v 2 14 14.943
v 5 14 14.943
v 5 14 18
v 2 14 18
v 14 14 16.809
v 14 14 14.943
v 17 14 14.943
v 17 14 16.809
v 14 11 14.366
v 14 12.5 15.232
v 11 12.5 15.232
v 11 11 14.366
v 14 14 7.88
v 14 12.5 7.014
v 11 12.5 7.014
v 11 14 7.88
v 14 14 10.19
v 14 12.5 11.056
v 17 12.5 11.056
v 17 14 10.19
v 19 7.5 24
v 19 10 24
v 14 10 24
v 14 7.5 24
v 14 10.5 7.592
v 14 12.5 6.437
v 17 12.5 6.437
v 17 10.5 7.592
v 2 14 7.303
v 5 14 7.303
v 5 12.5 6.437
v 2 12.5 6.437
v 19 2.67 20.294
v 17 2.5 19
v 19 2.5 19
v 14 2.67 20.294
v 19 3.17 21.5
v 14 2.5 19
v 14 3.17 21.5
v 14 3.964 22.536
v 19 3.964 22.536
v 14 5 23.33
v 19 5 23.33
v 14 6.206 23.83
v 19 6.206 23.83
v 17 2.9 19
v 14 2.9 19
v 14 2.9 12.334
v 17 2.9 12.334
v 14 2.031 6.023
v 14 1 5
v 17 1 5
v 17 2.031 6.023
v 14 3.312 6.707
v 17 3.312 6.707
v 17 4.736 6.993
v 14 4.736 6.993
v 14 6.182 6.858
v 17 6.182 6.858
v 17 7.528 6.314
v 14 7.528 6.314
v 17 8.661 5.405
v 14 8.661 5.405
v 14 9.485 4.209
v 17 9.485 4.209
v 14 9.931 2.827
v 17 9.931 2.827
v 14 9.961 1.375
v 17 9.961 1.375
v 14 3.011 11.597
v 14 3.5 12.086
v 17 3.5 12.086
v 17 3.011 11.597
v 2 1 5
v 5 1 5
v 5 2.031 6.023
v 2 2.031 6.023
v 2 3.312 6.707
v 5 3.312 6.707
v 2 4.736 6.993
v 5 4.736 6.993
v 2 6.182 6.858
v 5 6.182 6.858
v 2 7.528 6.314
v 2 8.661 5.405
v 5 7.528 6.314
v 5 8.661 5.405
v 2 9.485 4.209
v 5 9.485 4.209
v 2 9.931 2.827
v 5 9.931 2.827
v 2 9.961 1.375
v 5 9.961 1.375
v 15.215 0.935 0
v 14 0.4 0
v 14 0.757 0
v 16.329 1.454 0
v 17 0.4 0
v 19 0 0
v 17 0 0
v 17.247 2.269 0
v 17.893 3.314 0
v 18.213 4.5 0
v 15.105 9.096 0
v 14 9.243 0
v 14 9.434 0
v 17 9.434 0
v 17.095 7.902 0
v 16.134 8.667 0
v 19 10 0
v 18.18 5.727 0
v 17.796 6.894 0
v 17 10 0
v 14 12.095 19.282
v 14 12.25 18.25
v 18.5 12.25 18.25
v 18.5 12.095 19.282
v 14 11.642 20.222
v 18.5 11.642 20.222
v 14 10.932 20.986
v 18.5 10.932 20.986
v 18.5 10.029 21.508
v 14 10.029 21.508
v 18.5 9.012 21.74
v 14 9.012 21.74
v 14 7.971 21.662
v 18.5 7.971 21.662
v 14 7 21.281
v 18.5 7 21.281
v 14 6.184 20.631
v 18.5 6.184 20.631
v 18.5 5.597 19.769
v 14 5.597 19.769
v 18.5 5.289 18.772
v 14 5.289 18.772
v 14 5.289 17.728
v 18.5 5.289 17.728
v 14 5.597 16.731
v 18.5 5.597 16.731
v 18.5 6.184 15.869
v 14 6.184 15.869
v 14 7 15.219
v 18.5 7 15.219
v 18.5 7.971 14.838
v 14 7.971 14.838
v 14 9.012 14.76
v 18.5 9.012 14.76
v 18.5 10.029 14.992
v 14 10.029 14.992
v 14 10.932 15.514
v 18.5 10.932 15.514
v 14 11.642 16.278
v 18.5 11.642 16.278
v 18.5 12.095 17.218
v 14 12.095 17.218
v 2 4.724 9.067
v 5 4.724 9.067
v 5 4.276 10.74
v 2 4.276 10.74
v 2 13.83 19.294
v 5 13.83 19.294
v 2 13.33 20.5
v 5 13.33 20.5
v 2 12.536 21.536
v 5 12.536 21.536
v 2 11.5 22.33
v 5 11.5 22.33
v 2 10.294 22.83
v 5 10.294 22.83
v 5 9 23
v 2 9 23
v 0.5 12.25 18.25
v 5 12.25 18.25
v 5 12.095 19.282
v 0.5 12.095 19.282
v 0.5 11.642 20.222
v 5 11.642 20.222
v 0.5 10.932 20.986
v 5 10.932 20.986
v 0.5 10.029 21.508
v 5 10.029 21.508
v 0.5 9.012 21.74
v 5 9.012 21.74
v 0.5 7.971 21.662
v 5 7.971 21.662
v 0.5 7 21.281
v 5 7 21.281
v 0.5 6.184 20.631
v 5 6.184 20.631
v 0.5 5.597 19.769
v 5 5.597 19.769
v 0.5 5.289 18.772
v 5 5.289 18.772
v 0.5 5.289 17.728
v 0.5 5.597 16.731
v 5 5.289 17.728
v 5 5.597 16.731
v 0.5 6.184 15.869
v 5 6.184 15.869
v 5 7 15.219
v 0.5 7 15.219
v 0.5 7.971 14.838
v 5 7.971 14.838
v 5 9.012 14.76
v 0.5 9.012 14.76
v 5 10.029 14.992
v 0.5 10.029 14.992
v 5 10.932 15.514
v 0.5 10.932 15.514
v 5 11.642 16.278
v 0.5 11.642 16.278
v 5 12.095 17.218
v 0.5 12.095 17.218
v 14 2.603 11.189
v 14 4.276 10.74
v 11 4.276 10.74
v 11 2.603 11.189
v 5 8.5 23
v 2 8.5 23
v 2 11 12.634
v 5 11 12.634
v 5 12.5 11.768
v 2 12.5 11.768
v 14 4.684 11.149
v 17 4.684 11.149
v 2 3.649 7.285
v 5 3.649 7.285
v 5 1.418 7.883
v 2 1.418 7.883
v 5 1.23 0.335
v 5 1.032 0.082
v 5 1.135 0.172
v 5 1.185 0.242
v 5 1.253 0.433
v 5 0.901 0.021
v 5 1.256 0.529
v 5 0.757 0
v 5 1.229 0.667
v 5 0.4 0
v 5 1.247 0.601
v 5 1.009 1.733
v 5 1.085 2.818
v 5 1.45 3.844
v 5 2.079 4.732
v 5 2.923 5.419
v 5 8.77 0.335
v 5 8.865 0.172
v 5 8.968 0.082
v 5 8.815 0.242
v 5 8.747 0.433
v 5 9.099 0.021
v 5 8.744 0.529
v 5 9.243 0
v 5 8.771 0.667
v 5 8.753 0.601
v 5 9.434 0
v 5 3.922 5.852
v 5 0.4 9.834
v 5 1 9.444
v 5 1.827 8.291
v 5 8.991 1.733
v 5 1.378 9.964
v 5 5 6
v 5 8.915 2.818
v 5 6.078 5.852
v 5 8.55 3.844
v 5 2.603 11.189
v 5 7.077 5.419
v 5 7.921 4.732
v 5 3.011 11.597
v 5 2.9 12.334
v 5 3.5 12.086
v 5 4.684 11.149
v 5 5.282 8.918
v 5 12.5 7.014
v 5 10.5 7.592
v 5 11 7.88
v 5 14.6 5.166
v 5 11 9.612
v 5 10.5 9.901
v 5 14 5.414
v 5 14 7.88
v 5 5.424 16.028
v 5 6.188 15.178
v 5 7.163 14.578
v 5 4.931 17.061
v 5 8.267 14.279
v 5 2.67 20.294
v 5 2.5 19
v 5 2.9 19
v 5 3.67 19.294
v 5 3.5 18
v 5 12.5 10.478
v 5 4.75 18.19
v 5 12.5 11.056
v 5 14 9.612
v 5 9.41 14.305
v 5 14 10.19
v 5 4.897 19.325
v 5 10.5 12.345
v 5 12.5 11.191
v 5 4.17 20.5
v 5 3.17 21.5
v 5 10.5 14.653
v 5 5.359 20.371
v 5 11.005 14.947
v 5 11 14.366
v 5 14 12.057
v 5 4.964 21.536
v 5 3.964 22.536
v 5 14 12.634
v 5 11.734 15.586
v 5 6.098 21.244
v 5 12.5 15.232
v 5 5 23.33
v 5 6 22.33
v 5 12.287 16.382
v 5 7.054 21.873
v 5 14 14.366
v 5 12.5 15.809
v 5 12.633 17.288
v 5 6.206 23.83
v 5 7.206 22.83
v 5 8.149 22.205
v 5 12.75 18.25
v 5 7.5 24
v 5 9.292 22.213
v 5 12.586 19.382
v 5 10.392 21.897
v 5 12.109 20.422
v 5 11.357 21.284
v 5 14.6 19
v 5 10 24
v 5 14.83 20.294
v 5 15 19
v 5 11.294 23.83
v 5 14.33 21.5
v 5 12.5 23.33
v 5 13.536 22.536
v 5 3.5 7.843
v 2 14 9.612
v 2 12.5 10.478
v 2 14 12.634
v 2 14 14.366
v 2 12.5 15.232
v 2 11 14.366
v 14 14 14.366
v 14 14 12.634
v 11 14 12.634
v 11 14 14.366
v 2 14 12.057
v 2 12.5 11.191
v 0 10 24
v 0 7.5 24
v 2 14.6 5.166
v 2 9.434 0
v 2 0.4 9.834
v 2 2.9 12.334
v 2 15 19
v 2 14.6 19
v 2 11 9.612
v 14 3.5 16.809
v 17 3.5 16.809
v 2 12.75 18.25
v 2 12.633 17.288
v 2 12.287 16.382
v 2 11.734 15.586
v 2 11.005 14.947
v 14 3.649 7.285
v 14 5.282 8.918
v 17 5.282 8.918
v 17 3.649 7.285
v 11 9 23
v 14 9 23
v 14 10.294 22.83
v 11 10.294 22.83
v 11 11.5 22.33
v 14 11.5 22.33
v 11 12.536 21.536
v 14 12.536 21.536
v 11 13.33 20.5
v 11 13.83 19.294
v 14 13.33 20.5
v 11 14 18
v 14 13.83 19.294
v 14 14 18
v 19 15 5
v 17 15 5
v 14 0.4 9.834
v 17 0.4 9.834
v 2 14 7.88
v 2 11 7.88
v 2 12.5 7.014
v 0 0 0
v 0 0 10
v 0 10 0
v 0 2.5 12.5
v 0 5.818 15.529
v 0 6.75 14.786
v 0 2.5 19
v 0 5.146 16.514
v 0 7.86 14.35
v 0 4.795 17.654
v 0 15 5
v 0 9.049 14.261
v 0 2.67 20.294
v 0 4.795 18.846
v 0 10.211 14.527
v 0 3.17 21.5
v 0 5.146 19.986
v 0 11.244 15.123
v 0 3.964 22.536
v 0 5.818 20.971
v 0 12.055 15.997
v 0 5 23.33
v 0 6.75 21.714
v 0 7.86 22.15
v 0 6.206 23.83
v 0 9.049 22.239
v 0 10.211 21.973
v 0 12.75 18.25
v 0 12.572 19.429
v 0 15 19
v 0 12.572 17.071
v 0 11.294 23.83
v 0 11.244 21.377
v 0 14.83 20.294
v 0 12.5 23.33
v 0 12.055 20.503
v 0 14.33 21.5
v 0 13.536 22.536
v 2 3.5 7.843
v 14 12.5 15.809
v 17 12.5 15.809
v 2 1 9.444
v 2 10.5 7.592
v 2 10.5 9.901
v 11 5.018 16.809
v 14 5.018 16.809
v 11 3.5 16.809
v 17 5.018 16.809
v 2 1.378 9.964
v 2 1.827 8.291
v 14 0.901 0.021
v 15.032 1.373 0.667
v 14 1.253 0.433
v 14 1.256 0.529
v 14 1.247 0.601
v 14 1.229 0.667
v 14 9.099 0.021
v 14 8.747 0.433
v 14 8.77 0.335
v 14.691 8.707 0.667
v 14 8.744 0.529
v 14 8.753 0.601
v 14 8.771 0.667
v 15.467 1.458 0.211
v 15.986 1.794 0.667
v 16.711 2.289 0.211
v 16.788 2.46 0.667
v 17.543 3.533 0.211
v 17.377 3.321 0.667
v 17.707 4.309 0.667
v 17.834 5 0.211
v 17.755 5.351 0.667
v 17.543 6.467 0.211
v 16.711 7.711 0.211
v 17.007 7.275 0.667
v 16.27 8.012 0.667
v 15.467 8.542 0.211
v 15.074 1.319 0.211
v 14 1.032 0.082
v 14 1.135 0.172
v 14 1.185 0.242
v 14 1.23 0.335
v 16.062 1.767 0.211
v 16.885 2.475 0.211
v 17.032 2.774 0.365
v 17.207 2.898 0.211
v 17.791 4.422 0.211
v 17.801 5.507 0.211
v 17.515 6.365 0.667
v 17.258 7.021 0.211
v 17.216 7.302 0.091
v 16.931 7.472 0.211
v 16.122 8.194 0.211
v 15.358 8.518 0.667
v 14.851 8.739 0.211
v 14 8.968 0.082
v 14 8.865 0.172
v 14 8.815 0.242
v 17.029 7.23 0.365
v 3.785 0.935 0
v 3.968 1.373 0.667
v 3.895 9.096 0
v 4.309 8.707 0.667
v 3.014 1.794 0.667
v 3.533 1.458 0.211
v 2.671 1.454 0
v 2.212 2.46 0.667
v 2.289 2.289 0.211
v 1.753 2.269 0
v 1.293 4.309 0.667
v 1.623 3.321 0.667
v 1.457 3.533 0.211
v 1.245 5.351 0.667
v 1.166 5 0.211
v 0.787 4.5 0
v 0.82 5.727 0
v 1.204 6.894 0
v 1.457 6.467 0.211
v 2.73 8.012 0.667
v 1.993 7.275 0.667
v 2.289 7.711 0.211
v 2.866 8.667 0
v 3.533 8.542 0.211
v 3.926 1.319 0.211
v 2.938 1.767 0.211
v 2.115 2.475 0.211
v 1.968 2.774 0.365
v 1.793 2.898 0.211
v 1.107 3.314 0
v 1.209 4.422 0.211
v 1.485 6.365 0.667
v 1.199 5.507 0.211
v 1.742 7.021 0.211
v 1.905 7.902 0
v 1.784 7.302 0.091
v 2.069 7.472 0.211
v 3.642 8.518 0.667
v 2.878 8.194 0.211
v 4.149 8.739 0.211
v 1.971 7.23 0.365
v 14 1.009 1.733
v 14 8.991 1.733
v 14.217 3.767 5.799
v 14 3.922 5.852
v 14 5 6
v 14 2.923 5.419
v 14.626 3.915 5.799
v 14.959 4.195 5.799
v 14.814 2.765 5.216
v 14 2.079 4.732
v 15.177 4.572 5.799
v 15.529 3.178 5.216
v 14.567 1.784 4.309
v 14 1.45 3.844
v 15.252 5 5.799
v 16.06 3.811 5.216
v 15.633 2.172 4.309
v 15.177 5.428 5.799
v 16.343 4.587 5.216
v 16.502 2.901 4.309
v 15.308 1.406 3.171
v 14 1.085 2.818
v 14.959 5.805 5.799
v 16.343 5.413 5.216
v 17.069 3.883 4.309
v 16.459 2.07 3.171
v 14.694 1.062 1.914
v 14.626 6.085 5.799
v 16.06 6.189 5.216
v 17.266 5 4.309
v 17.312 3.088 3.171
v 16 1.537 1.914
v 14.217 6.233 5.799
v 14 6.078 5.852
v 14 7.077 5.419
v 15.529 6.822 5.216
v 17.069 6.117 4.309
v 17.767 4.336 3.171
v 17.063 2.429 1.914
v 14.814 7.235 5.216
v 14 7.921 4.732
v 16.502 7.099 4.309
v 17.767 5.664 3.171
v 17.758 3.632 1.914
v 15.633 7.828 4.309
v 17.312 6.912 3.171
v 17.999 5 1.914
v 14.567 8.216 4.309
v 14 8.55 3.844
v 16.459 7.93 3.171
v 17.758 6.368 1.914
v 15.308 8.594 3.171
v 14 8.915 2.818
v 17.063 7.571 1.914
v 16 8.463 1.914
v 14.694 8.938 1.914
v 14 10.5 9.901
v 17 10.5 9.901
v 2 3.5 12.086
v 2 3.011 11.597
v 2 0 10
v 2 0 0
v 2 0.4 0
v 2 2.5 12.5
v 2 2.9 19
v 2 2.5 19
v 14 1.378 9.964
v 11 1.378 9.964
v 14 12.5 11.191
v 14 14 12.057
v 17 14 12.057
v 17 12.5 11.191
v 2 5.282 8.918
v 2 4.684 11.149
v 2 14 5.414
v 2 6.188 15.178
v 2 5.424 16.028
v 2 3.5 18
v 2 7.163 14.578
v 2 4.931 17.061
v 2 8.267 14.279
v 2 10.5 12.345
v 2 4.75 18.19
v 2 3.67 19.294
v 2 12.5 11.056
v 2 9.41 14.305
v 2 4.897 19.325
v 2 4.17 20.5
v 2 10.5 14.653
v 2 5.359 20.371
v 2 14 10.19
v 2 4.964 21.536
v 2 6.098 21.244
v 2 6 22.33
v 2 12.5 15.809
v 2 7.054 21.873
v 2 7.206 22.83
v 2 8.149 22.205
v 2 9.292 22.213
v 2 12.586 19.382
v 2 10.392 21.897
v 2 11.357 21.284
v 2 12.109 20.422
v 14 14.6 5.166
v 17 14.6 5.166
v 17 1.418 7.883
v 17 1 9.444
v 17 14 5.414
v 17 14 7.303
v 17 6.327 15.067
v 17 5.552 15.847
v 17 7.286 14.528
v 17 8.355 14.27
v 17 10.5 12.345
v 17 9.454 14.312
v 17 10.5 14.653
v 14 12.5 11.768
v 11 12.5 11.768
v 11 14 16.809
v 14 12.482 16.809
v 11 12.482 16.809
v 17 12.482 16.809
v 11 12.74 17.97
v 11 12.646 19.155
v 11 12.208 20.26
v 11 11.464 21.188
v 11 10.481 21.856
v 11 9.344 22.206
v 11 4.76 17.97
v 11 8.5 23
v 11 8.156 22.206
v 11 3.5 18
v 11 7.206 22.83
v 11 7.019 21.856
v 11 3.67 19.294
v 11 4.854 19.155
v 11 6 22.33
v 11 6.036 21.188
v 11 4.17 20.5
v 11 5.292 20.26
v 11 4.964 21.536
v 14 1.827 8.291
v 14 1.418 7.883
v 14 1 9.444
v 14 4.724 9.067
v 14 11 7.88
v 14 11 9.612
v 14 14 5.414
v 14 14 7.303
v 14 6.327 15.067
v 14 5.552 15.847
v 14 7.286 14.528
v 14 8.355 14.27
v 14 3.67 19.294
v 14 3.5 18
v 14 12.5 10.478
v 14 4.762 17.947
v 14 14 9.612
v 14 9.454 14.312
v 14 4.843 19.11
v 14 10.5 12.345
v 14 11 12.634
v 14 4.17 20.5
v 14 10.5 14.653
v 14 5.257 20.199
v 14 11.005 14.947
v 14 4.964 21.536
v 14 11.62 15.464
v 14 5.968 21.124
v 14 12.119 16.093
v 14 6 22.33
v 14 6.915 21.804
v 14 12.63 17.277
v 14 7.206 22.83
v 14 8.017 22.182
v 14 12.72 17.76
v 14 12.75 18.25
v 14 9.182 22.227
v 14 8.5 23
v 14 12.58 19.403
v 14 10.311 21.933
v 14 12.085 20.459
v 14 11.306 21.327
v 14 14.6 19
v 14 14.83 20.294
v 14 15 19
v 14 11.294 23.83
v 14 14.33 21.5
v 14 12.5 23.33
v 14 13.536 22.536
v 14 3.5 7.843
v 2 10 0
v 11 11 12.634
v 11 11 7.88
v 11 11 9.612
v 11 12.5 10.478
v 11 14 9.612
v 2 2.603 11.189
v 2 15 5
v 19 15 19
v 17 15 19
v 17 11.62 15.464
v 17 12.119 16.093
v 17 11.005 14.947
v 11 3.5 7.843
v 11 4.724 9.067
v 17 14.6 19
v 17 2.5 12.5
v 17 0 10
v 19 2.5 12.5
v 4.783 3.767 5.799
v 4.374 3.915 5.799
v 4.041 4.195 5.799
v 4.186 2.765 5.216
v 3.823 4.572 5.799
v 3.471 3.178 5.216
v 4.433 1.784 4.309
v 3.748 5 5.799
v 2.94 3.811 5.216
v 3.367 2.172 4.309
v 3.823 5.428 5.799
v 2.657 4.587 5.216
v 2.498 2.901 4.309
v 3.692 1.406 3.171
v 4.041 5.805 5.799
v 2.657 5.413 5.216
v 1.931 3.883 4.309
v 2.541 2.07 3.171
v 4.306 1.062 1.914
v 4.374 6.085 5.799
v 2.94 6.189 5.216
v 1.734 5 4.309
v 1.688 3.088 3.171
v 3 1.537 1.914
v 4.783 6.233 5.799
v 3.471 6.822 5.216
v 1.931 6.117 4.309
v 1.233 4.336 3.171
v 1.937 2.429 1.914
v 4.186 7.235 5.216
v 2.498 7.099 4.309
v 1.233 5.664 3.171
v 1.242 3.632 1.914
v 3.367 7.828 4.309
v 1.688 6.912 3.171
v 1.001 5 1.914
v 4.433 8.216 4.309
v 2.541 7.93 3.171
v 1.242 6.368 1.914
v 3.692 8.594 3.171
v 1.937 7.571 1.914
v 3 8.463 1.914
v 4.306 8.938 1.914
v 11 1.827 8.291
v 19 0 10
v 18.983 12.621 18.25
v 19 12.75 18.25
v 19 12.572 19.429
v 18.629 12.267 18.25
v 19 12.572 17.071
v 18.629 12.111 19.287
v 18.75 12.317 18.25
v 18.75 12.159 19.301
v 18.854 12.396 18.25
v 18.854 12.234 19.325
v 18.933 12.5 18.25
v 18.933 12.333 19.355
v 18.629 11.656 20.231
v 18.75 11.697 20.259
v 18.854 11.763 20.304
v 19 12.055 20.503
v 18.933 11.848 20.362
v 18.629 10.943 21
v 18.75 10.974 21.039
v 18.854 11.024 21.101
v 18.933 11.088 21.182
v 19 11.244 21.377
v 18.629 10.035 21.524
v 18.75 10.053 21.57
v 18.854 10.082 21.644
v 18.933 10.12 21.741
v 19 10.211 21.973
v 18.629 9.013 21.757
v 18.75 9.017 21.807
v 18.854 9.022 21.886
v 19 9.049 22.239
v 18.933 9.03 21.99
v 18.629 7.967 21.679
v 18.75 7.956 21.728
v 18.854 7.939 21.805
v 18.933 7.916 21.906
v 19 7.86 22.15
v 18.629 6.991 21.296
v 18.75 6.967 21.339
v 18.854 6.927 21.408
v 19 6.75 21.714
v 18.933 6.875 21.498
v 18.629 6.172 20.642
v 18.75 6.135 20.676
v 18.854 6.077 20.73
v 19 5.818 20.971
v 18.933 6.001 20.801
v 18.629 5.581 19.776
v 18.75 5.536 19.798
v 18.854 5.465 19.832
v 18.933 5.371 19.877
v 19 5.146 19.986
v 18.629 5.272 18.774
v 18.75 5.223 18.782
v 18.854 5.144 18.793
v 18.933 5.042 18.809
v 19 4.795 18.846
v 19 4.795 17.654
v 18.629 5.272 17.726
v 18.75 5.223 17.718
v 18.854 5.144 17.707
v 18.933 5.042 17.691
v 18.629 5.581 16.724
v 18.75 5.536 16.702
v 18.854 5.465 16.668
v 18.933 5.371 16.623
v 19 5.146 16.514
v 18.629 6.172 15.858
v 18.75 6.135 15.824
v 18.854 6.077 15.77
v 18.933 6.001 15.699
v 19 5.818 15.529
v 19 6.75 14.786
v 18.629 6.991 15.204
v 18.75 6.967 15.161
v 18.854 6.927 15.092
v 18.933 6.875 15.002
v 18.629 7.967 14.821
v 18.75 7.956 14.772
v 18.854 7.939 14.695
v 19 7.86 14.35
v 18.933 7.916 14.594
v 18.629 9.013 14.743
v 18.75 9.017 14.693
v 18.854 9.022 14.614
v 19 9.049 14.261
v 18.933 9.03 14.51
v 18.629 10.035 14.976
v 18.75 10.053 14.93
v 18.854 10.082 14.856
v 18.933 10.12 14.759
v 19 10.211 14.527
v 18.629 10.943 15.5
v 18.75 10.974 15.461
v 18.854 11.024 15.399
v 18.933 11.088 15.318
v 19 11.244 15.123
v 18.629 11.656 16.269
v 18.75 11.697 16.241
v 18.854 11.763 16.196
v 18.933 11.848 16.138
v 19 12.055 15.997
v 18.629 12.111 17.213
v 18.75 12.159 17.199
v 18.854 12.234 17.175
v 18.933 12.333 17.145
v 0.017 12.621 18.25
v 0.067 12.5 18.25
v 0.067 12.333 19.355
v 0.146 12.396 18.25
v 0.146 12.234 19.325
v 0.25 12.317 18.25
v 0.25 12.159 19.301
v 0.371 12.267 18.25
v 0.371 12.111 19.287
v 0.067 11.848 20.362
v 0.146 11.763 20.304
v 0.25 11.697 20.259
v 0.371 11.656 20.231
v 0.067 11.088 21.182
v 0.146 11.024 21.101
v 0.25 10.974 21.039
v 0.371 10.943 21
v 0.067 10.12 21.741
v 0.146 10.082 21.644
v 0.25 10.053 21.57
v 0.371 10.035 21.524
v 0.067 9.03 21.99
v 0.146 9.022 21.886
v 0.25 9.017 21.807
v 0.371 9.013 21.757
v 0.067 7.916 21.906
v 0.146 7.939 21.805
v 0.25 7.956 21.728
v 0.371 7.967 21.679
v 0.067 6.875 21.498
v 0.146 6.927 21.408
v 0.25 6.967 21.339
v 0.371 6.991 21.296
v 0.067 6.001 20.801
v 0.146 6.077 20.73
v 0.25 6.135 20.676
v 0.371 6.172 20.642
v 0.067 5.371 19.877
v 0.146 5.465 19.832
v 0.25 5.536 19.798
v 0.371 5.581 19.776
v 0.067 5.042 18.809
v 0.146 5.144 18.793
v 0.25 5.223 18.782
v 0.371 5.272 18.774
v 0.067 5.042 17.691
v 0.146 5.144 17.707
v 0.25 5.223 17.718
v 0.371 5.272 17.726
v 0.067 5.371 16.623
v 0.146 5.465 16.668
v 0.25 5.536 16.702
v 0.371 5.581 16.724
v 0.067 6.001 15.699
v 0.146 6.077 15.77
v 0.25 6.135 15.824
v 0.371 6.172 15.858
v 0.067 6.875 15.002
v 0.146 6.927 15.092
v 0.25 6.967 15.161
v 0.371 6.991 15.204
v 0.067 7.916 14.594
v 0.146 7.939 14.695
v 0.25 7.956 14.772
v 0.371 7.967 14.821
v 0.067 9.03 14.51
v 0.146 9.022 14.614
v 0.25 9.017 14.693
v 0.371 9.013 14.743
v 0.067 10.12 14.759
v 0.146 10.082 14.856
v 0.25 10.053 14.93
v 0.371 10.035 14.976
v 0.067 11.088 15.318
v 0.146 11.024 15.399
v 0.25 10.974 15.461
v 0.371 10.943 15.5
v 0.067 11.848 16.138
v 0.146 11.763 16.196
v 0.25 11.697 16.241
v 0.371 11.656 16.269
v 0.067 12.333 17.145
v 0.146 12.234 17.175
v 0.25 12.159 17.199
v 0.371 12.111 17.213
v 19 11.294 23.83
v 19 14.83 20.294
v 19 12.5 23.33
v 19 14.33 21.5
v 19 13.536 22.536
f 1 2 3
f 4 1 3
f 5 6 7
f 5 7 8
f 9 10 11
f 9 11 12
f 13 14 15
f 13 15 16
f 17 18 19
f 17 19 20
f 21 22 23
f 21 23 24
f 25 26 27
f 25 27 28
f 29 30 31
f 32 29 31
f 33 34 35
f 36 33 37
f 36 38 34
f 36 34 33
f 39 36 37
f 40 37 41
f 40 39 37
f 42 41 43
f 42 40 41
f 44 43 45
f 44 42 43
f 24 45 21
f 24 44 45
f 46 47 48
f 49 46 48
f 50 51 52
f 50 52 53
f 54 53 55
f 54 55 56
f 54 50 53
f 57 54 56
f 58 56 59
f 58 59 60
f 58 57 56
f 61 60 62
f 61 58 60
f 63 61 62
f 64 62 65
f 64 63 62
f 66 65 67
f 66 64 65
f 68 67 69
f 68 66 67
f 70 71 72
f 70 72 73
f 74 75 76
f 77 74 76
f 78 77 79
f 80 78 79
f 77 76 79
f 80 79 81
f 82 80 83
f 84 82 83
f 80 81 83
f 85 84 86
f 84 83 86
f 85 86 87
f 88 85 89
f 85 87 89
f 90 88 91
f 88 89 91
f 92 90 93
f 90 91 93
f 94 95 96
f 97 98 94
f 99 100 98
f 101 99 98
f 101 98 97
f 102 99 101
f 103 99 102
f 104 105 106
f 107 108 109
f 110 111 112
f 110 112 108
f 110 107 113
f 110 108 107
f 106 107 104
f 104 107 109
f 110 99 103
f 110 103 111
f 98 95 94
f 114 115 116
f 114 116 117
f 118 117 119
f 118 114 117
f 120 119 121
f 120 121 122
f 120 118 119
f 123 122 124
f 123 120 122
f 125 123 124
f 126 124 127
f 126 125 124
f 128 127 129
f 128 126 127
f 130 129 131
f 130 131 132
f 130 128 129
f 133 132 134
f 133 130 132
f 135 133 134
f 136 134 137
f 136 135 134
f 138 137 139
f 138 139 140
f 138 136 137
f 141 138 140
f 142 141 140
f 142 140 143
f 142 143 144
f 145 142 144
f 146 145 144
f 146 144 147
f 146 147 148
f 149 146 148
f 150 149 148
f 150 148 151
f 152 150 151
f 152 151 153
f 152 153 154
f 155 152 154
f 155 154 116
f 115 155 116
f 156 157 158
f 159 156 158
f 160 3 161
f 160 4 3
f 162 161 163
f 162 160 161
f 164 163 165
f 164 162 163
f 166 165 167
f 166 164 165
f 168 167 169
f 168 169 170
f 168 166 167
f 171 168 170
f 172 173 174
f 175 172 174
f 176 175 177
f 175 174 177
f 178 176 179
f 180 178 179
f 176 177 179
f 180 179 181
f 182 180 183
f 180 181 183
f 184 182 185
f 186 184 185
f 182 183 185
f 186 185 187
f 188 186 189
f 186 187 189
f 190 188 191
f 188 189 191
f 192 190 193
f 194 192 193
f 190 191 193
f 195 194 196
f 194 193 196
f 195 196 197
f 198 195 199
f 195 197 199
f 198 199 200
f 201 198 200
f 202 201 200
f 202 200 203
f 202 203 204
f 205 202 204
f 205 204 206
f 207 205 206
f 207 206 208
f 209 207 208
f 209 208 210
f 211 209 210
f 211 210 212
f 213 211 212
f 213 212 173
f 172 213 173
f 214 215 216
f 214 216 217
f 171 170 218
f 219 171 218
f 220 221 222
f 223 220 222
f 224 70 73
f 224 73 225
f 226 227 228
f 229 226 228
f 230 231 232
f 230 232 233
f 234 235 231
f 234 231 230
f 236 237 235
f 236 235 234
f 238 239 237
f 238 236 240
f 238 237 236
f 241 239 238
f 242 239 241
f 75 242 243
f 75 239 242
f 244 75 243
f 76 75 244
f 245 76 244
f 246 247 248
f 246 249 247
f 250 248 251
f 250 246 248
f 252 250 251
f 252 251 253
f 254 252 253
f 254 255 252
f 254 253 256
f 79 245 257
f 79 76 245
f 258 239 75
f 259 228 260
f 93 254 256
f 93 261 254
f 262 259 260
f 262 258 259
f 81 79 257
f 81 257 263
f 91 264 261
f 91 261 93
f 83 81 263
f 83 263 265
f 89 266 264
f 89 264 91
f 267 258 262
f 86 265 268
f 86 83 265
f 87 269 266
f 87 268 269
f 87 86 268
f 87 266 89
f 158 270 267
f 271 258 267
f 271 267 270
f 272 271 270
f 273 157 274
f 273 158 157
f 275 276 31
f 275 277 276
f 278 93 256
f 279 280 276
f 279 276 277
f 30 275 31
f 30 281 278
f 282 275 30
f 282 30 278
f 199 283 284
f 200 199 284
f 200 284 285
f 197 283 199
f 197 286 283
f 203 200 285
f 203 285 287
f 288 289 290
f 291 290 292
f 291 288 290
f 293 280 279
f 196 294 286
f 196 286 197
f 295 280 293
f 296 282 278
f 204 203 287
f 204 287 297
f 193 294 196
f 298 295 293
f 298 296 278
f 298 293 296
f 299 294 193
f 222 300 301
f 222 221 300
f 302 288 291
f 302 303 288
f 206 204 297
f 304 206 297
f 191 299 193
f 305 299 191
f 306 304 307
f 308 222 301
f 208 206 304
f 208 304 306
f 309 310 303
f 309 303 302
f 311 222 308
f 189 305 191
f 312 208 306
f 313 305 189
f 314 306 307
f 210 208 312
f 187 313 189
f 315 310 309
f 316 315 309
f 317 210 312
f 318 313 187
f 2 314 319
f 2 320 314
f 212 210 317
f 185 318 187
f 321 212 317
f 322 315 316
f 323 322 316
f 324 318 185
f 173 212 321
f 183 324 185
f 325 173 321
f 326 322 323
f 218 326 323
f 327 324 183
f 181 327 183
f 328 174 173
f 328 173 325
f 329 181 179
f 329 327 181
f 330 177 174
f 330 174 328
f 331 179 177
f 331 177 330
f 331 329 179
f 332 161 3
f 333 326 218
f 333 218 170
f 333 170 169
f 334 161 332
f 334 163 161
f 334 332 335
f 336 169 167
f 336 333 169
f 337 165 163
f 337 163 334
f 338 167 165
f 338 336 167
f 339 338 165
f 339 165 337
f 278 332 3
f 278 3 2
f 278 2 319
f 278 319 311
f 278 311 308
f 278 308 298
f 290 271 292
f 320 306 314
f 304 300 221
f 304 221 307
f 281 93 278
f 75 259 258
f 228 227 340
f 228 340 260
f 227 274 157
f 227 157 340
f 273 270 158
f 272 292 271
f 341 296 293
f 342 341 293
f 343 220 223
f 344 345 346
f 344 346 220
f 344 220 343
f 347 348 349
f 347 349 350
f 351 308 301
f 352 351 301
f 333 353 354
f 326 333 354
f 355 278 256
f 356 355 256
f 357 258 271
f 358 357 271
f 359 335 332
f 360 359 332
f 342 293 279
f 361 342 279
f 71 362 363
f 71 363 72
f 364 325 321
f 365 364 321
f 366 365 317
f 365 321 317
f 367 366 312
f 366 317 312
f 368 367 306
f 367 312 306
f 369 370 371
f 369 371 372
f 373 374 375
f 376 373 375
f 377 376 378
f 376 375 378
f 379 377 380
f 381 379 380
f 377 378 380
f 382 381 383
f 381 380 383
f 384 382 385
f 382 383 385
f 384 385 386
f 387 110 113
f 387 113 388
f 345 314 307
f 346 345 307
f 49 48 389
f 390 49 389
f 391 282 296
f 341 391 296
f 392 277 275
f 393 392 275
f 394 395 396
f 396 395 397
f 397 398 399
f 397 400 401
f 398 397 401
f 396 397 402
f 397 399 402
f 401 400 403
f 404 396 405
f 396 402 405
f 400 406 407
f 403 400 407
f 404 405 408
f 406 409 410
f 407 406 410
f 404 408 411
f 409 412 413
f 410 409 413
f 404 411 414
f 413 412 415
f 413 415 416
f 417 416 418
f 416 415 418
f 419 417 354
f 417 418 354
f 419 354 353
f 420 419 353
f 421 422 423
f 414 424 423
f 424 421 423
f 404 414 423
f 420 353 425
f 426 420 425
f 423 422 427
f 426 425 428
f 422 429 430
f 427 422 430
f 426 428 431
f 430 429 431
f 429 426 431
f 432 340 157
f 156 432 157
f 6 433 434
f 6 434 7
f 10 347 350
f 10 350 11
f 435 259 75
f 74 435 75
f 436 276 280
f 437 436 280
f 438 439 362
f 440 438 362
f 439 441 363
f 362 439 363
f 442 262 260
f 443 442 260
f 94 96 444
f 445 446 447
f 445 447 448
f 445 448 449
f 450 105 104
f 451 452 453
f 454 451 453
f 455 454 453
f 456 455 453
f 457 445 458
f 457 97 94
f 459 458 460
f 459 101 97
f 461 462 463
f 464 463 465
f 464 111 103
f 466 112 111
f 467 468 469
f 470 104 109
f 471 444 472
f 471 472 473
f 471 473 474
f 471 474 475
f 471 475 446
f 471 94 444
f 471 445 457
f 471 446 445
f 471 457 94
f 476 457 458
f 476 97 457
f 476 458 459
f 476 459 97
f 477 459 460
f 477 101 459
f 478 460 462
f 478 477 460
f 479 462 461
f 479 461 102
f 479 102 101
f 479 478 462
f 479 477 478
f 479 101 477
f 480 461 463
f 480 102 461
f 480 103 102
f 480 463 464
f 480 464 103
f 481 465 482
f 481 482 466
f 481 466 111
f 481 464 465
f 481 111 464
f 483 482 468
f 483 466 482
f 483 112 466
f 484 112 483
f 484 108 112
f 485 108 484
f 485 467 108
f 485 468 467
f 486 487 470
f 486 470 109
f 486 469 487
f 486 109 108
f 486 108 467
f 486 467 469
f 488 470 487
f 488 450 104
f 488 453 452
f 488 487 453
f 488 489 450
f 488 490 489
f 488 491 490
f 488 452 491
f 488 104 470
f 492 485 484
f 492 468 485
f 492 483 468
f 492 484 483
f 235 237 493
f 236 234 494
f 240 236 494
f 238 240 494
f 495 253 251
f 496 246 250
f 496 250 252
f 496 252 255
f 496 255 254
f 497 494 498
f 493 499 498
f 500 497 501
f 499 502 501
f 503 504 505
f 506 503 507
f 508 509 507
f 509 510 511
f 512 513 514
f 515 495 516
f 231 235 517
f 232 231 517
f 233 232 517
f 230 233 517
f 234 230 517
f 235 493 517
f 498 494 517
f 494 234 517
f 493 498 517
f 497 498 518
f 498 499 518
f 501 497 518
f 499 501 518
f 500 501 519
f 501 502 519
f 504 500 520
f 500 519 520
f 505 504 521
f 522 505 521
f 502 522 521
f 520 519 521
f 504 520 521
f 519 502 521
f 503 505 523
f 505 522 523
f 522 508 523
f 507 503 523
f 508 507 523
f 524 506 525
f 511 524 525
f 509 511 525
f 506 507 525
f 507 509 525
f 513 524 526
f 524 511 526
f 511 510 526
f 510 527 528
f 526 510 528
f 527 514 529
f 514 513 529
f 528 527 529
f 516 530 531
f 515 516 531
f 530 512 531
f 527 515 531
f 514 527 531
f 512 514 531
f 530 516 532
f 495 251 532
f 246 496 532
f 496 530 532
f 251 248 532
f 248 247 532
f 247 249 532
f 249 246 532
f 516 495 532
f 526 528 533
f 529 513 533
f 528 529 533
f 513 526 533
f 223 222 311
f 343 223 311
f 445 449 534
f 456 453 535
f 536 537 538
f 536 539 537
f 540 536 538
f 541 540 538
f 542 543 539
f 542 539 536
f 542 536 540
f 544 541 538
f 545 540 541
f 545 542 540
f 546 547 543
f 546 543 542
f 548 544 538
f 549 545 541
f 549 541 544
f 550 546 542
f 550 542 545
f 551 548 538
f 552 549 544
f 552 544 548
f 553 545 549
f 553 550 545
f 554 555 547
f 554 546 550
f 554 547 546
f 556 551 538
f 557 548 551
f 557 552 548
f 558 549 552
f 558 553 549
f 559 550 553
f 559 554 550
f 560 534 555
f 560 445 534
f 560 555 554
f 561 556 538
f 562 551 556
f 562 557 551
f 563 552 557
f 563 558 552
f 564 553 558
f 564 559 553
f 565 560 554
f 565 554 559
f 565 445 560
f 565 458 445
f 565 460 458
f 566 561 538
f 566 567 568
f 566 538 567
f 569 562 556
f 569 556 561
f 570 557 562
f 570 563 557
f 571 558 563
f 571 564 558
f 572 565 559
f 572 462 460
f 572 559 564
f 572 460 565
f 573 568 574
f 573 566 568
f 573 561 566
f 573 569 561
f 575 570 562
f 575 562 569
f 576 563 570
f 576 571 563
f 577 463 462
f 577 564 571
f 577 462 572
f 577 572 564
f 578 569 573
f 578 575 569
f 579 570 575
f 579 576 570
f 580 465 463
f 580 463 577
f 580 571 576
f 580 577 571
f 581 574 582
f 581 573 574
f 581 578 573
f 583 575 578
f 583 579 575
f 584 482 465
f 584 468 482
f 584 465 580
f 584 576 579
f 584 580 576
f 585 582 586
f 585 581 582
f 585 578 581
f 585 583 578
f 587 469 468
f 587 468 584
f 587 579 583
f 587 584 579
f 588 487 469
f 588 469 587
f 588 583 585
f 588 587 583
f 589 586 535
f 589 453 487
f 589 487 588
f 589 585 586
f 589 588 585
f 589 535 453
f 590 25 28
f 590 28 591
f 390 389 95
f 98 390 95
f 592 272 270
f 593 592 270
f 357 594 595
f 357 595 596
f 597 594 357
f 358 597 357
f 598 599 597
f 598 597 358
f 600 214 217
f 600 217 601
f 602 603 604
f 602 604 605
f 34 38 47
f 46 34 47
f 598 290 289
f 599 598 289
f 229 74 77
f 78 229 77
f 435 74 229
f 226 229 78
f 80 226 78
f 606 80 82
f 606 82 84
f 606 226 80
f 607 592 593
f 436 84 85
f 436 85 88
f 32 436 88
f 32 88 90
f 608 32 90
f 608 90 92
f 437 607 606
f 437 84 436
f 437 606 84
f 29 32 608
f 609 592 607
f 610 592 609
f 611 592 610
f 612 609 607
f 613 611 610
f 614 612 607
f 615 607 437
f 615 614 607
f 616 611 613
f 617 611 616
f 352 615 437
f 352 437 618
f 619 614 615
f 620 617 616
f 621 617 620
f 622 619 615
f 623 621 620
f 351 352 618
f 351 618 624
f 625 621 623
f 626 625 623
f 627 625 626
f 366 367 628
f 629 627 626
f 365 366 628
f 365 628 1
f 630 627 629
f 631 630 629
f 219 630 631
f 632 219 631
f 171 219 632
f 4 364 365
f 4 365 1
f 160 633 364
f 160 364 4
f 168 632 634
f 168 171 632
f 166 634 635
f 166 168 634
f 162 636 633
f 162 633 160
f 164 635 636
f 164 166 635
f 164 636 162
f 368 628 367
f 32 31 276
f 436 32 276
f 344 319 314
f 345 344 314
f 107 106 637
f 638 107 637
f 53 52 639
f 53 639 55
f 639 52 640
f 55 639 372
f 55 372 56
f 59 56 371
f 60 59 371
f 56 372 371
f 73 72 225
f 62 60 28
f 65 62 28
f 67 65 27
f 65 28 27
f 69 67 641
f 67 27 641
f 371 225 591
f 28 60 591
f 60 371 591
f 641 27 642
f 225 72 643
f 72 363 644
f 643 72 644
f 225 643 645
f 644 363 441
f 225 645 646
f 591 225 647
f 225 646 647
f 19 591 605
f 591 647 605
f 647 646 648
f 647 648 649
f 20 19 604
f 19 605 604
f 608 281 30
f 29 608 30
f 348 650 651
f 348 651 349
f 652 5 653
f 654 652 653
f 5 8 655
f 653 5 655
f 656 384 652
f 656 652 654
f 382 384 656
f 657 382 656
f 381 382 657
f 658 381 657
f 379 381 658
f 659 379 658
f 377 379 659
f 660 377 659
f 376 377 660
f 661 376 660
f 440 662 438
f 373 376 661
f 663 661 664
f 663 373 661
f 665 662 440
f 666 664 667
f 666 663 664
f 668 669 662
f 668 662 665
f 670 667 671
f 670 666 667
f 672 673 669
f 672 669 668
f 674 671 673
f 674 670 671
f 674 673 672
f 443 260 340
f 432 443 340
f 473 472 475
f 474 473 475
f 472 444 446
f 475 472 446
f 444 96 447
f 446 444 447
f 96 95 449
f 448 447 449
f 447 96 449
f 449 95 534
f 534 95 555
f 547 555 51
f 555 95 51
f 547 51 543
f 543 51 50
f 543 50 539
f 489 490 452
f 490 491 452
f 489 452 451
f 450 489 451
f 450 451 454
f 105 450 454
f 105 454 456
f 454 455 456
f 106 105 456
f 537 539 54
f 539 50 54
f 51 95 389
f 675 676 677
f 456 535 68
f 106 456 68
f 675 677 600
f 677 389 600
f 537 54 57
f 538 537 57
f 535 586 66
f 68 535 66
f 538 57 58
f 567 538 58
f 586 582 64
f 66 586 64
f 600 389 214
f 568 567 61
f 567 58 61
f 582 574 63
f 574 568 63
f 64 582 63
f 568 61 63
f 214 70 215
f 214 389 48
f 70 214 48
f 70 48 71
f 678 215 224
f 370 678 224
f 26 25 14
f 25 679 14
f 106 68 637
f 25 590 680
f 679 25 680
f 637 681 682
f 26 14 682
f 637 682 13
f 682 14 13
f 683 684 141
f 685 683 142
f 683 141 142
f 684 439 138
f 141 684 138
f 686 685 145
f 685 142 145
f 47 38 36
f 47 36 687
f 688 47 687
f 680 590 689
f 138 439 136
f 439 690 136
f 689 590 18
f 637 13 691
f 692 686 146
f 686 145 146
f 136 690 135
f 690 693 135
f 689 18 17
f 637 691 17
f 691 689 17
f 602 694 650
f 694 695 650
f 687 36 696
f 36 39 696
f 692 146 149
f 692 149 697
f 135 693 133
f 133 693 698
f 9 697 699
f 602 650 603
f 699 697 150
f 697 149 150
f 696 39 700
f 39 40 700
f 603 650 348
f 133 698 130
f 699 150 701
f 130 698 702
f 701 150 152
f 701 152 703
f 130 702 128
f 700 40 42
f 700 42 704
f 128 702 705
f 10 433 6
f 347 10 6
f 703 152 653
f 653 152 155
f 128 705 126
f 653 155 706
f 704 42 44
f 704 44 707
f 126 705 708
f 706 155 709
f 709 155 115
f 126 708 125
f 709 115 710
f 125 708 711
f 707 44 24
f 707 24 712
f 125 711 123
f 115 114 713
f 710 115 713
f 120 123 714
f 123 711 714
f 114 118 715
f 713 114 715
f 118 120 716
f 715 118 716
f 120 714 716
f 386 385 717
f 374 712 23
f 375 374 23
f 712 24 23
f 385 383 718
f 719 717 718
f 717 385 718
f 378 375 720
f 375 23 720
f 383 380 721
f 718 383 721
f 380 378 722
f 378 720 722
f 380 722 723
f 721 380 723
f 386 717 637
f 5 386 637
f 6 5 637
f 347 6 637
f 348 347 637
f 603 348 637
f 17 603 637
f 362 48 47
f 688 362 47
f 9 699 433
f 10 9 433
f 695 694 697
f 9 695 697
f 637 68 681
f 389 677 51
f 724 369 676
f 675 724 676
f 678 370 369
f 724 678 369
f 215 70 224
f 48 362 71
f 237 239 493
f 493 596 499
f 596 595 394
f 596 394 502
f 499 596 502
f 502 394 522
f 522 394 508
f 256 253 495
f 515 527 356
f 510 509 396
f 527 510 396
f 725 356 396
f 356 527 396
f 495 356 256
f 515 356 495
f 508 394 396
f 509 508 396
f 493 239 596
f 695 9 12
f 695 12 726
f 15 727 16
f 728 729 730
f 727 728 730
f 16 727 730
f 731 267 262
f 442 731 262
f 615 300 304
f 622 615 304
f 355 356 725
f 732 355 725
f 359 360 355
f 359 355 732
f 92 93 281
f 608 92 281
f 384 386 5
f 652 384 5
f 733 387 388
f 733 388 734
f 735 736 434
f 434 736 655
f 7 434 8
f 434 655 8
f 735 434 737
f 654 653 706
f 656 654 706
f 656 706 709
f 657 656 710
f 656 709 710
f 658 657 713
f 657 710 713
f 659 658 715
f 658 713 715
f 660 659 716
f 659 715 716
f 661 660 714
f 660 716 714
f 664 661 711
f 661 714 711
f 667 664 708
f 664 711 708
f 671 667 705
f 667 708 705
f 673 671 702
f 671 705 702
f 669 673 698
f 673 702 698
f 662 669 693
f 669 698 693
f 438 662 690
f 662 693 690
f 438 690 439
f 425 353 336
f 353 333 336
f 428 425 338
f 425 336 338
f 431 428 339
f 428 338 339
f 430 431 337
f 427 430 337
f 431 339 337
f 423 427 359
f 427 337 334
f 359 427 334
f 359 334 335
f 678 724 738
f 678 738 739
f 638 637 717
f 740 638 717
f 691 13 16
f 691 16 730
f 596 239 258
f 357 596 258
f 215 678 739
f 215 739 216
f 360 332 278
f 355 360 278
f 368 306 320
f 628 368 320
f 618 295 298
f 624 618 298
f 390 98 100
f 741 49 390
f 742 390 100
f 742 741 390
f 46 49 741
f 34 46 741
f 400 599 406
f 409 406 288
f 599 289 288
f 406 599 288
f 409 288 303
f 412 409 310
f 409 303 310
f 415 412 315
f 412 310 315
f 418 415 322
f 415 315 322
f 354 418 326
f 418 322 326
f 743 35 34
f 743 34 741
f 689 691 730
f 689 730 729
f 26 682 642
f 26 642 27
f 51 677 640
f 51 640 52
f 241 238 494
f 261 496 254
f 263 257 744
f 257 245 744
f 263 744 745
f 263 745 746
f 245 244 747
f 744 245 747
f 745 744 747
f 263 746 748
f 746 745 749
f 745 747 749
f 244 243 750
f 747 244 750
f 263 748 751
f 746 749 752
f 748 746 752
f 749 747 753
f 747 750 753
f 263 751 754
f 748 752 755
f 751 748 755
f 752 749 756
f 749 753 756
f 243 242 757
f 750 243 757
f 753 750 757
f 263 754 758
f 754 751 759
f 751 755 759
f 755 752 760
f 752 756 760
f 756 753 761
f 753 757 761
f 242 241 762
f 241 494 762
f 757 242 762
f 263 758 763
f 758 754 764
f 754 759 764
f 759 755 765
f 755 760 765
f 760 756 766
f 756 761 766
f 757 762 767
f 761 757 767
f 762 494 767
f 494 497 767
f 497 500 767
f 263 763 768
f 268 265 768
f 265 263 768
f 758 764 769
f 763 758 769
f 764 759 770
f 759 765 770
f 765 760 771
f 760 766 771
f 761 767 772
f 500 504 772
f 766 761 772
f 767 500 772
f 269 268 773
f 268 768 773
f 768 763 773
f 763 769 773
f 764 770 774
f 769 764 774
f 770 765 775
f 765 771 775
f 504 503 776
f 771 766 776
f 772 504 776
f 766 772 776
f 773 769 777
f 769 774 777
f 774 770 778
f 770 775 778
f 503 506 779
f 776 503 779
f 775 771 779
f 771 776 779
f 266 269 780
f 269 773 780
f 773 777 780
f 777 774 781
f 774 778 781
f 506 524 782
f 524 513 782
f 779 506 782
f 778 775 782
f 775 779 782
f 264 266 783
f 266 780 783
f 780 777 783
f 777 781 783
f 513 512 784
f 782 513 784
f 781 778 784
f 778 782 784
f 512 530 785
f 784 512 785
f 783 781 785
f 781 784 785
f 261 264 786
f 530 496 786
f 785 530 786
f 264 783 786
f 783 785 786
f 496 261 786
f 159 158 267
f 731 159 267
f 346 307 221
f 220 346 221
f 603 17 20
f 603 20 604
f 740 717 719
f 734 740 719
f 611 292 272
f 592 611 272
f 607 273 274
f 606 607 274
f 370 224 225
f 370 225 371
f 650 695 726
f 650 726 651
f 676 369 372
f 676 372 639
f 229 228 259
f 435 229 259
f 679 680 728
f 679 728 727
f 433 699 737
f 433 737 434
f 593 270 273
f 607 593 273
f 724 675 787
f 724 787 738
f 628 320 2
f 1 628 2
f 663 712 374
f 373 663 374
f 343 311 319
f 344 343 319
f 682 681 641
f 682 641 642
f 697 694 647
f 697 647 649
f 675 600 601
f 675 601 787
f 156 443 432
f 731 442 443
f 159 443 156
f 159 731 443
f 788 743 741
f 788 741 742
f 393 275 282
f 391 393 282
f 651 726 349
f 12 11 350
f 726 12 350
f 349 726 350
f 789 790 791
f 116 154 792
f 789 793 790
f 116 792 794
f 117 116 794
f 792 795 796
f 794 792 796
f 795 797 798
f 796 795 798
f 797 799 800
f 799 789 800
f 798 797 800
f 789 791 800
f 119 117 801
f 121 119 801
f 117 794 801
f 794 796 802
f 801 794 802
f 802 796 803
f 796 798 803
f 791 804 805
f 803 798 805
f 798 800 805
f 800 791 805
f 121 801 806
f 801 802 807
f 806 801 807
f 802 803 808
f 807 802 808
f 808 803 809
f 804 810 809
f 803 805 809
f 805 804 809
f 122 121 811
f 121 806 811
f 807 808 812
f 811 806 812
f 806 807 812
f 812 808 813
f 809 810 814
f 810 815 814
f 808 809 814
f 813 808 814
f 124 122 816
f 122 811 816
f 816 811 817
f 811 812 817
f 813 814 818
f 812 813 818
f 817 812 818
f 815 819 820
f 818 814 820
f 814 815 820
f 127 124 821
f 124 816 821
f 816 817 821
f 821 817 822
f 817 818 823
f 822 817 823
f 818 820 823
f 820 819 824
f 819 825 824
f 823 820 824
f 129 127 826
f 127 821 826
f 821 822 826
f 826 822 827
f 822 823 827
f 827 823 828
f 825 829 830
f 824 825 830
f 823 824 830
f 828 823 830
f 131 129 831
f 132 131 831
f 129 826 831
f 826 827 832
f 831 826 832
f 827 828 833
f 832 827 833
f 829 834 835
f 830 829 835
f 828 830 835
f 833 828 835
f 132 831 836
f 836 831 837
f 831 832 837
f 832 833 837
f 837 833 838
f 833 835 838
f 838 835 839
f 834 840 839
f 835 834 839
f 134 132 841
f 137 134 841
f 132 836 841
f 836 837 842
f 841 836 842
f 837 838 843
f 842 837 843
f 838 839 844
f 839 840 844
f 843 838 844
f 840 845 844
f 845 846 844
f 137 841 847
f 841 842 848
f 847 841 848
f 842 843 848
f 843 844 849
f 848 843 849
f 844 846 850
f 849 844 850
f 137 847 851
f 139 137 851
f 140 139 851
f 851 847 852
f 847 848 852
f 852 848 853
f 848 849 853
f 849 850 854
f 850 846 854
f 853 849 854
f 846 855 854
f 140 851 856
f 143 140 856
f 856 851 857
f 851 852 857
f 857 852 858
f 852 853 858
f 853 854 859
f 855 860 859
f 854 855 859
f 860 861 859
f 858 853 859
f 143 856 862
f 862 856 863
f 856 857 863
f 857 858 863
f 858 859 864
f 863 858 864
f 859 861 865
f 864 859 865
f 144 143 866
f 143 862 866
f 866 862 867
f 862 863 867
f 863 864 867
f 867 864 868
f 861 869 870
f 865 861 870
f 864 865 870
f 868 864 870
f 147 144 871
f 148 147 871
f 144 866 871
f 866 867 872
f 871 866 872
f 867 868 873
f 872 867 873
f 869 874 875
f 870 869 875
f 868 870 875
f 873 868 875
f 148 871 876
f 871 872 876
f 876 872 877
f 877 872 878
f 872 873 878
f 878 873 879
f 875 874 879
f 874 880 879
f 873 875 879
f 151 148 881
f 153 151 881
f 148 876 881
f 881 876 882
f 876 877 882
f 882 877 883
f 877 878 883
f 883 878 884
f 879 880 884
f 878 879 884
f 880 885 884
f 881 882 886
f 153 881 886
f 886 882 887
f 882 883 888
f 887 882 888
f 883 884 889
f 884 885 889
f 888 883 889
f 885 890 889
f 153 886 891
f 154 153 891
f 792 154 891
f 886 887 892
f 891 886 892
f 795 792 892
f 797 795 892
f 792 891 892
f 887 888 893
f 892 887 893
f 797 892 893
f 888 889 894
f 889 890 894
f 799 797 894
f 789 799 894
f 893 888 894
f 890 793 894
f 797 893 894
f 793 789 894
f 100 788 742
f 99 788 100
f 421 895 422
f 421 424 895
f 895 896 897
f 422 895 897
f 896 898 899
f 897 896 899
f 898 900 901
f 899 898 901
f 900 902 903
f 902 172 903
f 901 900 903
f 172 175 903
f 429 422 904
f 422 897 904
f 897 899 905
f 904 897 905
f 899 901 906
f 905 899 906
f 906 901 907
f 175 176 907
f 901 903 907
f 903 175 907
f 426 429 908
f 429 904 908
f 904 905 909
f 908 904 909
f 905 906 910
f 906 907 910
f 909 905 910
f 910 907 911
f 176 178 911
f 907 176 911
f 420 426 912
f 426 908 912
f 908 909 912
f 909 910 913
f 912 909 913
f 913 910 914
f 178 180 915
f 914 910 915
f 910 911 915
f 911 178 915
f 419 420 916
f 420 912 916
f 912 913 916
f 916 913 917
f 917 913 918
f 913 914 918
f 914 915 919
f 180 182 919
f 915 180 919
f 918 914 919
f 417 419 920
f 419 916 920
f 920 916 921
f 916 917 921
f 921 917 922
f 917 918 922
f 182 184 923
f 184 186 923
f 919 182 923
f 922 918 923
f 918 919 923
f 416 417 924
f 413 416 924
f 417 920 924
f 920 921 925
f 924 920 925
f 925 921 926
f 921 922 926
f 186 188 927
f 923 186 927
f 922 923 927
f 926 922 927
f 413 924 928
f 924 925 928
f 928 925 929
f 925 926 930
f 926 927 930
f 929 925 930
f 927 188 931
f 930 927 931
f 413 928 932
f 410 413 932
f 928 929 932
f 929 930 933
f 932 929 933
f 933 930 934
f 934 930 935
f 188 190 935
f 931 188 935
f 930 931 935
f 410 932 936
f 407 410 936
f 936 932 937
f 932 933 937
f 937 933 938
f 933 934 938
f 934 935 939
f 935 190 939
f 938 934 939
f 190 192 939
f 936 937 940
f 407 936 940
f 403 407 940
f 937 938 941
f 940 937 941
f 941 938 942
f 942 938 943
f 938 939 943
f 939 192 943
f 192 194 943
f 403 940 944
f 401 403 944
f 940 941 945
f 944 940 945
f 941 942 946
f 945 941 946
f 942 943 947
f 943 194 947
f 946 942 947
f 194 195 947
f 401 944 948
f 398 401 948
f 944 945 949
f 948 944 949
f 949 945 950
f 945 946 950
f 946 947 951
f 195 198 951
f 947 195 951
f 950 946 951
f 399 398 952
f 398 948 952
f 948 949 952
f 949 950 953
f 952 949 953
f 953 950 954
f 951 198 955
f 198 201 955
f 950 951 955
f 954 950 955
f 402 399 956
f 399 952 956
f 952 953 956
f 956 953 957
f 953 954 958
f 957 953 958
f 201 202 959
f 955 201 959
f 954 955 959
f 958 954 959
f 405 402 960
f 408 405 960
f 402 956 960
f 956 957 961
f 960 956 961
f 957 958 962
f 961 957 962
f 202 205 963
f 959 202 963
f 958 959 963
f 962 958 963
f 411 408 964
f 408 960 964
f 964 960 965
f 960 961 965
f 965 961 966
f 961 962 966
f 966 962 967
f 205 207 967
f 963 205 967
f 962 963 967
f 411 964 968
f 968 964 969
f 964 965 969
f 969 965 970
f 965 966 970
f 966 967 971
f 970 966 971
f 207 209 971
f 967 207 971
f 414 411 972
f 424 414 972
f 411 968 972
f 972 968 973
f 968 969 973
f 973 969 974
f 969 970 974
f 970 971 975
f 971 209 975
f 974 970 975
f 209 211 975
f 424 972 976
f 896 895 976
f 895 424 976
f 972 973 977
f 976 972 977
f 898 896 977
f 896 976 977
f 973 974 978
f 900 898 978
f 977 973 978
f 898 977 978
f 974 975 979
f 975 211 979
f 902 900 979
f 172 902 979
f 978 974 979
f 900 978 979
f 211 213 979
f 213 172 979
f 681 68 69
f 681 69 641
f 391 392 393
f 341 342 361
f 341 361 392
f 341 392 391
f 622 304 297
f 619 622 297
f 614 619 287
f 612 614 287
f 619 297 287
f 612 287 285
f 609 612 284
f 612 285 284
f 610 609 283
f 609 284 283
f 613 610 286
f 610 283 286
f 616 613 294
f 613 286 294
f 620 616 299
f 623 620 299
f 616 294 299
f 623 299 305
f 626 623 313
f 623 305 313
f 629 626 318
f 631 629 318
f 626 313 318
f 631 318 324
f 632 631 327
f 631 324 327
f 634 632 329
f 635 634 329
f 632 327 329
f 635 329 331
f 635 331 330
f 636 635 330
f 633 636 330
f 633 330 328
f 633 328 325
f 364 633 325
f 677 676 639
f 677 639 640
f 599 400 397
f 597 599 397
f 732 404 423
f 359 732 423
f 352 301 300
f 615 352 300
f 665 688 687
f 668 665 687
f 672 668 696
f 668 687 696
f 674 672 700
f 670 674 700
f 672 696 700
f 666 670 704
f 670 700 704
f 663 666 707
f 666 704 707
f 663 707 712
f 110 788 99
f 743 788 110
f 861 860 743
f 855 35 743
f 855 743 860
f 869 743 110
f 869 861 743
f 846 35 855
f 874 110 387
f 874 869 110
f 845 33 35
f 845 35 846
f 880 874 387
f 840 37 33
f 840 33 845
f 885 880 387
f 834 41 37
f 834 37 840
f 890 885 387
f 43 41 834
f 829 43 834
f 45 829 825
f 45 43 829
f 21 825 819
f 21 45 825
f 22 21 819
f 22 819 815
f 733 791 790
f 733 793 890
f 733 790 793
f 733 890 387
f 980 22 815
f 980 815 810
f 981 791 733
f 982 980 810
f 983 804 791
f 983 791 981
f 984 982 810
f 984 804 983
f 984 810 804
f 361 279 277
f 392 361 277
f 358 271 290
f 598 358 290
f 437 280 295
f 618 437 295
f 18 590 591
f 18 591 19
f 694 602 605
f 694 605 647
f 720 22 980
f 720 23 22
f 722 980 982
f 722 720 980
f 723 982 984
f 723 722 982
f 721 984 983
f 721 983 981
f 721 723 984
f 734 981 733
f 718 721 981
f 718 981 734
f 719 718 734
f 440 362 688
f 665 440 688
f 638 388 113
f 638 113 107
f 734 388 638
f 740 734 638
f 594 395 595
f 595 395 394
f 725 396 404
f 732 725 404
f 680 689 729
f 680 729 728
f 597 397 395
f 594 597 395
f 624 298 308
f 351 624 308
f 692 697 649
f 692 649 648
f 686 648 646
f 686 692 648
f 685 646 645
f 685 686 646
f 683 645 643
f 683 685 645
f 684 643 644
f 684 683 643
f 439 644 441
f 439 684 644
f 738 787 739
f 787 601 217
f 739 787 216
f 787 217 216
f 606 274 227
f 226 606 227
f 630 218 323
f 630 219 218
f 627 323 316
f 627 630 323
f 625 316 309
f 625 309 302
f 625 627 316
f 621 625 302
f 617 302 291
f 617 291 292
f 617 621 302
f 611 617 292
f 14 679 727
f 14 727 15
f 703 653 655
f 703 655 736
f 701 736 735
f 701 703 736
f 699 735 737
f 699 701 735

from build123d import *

# Parameters (mm, degrees)
F1_DEPTH  = 5
F4_R      = 3.5
F5_DEPTH  = 25
F7_DEPTH  = 3
F9_R      = 5
F11_DEPTH = 6
F13_DEPTH = 6
F14_R     = 0.5
F14_2_R   = 0.5
F16_DEPTH = 3
F18_DEPTH = 3


with BuildPart() as f1:
    # F0 (on Right) → F1 (new body)
    with BuildSketch(Plane.YZ):
        Polygon((0, 10), (0, 0), (10, 0), (15, 5), (15, 20), (15, 24), (2.5, 24), (2.5, 20), (2.5, 12.5), align=None)
    extrude(amount=F1_DEPTH)

    # F2 (on face) → F3 (revolve, cut)
    with BuildSketch(Plane.YZ.offset(5)):
        with BuildLine():
            Line((5, -2), (5, 6))
            ThreePointArc((5, 6), (1, 2), (5, -2))
        make_face()
    revolve(axis=Axis((5, 5, 2), (0, 0, -1)), mode=Mode.SUBTRACT)

    # F4 (on face) → F5 (cut)
    with BuildSketch(Plane.YZ.offset(5)):
        with Locations((8.75, 18.25)):
            Circle(F4_R)
    extrude(amount=-F5_DEPTH, mode=Mode.SUBTRACT)

    # F6 (on face) → F7 (cut)
    with BuildSketch(Plane.YZ.offset(5)):
        with BuildLine():
            Line((1.4182789124, 7.8827450064), (1, 9.4437831591))
            Line((1, 9.4437831591), (1, 5))
            ThreePointArc((1, 5), (6.8750834794, 6.6350902845), (9.9607833148, 1.3749968772))
            Line((9.9607833148, 1.3749968772), (14, 5.4142135624))
            Line((14, 5.4142135624), (14, 7.3028310874))
            Line((14, 7.3028310874), (12.5, 6.4368056836))
            Line((12.5, 6.4368056836), (10.5, 7.591506222))
            Line((10.5, 7.591506222), (10.5, 9.9009072988))
            Line((10.5, 9.9009072988), (12.5, 11.0556078372))
            Line((12.5, 11.0556078372), (14, 10.1895824334))
            Line((14, 10.1895824334), (14, 12.056624327))
            Line((14, 12.056624327), (12.5, 11.1905989232))
            Line((12.5, 11.1905989232), (10.5, 12.3452994616))
            Line((10.5, 12.3452994616), (10.5, 14.6531263575))
            ThreePointArc((10.5, 14.6531263575), (5.3588350084, 20.3713203436), (12.75, 18.25))
            ThreePointArc((12.75, 18.25), (12.2870669156, 16.3820712982), (11.0054211826, 14.9465055942))
            Line((11.0054211826, 14.9465055942), (12.5, 15.8094010768))
            Line((12.5, 15.8094010768), (14, 14.943375673))
            Line((14, 14.943375673), (14, 23))
            Line((14, 23), (3.5, 23))
            Line((3.5, 23), (3.5, 12.0857864376))
            Line((3.5, 12.0857864376), (3.0112326286, 11.5970190662))
            Line((3.0112326286, 11.5970190662), (4.6842652361, 11.1487313301))
            Line((4.6842652361, 11.1487313301), (5.2819822175, 8.9180211868))
            Line((5.2819822175, 8.9180211868), (3.6489890557, 7.285028025))
            Line((3.6489890557, 7.285028025), (1.4182789124, 7.8827450064))
        make_face()
        Polygon((2.6029843381, 11.1887707758), (1.3782394667, 9.9640259044), (1.8265272028, 8.2909932969), (3.4995598103, 7.8427055608), (4.7243046817, 9.0674504322), (4.2760169456, 10.7404830397), align=None)
        Polygon((12.5, 7.0141559528), (14, 7.8801813566), (14, 9.6122321642), (12.5, 10.478257568), (11, 9.6122321642), (11, 7.8801813566), align=None)
        Polygon((14, 12.6339745962), (14, 14.3660254038), (12.5, 15.2320508076), (11, 14.3660254038), (11, 12.6339745962), (12.5, 11.7679491924), align=None)
    extrude(amount=-F7_DEPTH, mode=Mode.SUBTRACT)

    # F9
    f9_edges = [f1.edges().sort_by_distance(p)[0] for p in [
        (2.5, 2.5, 24),
        (2.5, 15, 24),
        (3.5, 3.5, 23),
        (3.5, 14, 23),
    ]]
    fillet(f9_edges, radius=F9_R)


with BuildPart() as f10_1:
    # F10: instance of F1
    add(f1.part.mirror(Plane.YZ.offset(9.5)))

    # F11 (add): faces of the model
    f11_faces = [f10_1.faces().sort_by_distance(p)[0] for p in [
        (17, 12.5, 8.7462067604),
        (17, 12.5, 13.5),
        (17, 3.0512720742, 9.5157381683),
    ]]
    extrude(f11_faces, amount=F11_DEPTH)

    # F12 (on face) → F13 (join)
    with BuildSketch(Plane(origin=(17, 0, 0), x_dir=(0, -1, 0), z_dir=(-1, 0, 0))):
        with BuildLine():
            Line((-14, 18), (-14, 16.8094010768))
            Line((-14, 16.8094010768), (-12.4815780499, 16.8094010768))
            ThreePointArc((-12.4815780499, 16.8094010768), (-8.75, 22.25), (-5.0184219501, 16.8094010768))
            Line((-5.0184219501, 16.8094010768), (-3.5, 16.8094010768))
            Line((-3.5, 16.8094010768), (-3.5, 18))
            ThreePointArc((-3.5, 18), (-4.9644660941, 21.5355339059), (-8.5, 23))
            Line((-8.5, 23), (-9, 23))
            ThreePointArc((-9, 23), (-12.5355339059, 21.5355339059), (-14, 18))
        make_face()
    extrude(amount=F13_DEPTH)

    # F14#2
    f14_2_edges = [f10_1.edges().sort_by_distance(p)[0] for p in [
        (19, 5.25, 18.25),
        (17.464102, 5, 0),
    ]]
    fillet(f14_2_edges, radius=F14_2_R)

    # F17 (on face) → F18 (cut)
    with BuildSketch(Plane(origin=(14, 0, 0), x_dir=(0, -1, 0), z_dir=(-1, 0, 0))):
        Polygon((-14.6, 19), (-15, 19), (-15, 5), (-10, 0), (-9.4343145751, 0), (-14.6, 5.1656854249), align=None)
        Polygon((-0.4, 0), (0, 0), (0, 10), (-2.5, 12.5), (-2.5, 19), (-2.9, 19), (-2.9, 12.3343145751), (-0.4, 9.8343145751), align=None)
    extrude(amount=-F18_DEPTH, mode=Mode.SUBTRACT)


with BuildPart() as f1_1:
    add(f1.part)

    # F14
    f14_edges = [f1_1.edges().sort_by_distance(p)[0] for p in [
        (0, 5.25, 18.25),
        (1.535898, 5, 0),
    ]]
    fillet(f14_edges, radius=F14_R)

    # F15 (on face) → F16 (cut)
    with BuildSketch(Plane.YZ.offset(5)):
        Polygon((0, 10), (0, 0), (0.4, 0), (0.4, 9.8343145751), (2.8896803781, 12.3239949532), (2.9, 12.3343145751), (2.9, 12.8194838762), (2.9, 19), (2.5, 19), (2.5, 12.5), align=None)
        Polygon((15, 5), (15, 19), (14.6, 19), (14.6, 5.1656854249), (14.5191117842, 5.0847972091), (9.4343145751, 0), (10, 0), align=None)
    extrude(amount=-F16_DEPTH, mode=Mode.SUBTRACT)


solid = Compound([f10_1.part, f1_1.part])
